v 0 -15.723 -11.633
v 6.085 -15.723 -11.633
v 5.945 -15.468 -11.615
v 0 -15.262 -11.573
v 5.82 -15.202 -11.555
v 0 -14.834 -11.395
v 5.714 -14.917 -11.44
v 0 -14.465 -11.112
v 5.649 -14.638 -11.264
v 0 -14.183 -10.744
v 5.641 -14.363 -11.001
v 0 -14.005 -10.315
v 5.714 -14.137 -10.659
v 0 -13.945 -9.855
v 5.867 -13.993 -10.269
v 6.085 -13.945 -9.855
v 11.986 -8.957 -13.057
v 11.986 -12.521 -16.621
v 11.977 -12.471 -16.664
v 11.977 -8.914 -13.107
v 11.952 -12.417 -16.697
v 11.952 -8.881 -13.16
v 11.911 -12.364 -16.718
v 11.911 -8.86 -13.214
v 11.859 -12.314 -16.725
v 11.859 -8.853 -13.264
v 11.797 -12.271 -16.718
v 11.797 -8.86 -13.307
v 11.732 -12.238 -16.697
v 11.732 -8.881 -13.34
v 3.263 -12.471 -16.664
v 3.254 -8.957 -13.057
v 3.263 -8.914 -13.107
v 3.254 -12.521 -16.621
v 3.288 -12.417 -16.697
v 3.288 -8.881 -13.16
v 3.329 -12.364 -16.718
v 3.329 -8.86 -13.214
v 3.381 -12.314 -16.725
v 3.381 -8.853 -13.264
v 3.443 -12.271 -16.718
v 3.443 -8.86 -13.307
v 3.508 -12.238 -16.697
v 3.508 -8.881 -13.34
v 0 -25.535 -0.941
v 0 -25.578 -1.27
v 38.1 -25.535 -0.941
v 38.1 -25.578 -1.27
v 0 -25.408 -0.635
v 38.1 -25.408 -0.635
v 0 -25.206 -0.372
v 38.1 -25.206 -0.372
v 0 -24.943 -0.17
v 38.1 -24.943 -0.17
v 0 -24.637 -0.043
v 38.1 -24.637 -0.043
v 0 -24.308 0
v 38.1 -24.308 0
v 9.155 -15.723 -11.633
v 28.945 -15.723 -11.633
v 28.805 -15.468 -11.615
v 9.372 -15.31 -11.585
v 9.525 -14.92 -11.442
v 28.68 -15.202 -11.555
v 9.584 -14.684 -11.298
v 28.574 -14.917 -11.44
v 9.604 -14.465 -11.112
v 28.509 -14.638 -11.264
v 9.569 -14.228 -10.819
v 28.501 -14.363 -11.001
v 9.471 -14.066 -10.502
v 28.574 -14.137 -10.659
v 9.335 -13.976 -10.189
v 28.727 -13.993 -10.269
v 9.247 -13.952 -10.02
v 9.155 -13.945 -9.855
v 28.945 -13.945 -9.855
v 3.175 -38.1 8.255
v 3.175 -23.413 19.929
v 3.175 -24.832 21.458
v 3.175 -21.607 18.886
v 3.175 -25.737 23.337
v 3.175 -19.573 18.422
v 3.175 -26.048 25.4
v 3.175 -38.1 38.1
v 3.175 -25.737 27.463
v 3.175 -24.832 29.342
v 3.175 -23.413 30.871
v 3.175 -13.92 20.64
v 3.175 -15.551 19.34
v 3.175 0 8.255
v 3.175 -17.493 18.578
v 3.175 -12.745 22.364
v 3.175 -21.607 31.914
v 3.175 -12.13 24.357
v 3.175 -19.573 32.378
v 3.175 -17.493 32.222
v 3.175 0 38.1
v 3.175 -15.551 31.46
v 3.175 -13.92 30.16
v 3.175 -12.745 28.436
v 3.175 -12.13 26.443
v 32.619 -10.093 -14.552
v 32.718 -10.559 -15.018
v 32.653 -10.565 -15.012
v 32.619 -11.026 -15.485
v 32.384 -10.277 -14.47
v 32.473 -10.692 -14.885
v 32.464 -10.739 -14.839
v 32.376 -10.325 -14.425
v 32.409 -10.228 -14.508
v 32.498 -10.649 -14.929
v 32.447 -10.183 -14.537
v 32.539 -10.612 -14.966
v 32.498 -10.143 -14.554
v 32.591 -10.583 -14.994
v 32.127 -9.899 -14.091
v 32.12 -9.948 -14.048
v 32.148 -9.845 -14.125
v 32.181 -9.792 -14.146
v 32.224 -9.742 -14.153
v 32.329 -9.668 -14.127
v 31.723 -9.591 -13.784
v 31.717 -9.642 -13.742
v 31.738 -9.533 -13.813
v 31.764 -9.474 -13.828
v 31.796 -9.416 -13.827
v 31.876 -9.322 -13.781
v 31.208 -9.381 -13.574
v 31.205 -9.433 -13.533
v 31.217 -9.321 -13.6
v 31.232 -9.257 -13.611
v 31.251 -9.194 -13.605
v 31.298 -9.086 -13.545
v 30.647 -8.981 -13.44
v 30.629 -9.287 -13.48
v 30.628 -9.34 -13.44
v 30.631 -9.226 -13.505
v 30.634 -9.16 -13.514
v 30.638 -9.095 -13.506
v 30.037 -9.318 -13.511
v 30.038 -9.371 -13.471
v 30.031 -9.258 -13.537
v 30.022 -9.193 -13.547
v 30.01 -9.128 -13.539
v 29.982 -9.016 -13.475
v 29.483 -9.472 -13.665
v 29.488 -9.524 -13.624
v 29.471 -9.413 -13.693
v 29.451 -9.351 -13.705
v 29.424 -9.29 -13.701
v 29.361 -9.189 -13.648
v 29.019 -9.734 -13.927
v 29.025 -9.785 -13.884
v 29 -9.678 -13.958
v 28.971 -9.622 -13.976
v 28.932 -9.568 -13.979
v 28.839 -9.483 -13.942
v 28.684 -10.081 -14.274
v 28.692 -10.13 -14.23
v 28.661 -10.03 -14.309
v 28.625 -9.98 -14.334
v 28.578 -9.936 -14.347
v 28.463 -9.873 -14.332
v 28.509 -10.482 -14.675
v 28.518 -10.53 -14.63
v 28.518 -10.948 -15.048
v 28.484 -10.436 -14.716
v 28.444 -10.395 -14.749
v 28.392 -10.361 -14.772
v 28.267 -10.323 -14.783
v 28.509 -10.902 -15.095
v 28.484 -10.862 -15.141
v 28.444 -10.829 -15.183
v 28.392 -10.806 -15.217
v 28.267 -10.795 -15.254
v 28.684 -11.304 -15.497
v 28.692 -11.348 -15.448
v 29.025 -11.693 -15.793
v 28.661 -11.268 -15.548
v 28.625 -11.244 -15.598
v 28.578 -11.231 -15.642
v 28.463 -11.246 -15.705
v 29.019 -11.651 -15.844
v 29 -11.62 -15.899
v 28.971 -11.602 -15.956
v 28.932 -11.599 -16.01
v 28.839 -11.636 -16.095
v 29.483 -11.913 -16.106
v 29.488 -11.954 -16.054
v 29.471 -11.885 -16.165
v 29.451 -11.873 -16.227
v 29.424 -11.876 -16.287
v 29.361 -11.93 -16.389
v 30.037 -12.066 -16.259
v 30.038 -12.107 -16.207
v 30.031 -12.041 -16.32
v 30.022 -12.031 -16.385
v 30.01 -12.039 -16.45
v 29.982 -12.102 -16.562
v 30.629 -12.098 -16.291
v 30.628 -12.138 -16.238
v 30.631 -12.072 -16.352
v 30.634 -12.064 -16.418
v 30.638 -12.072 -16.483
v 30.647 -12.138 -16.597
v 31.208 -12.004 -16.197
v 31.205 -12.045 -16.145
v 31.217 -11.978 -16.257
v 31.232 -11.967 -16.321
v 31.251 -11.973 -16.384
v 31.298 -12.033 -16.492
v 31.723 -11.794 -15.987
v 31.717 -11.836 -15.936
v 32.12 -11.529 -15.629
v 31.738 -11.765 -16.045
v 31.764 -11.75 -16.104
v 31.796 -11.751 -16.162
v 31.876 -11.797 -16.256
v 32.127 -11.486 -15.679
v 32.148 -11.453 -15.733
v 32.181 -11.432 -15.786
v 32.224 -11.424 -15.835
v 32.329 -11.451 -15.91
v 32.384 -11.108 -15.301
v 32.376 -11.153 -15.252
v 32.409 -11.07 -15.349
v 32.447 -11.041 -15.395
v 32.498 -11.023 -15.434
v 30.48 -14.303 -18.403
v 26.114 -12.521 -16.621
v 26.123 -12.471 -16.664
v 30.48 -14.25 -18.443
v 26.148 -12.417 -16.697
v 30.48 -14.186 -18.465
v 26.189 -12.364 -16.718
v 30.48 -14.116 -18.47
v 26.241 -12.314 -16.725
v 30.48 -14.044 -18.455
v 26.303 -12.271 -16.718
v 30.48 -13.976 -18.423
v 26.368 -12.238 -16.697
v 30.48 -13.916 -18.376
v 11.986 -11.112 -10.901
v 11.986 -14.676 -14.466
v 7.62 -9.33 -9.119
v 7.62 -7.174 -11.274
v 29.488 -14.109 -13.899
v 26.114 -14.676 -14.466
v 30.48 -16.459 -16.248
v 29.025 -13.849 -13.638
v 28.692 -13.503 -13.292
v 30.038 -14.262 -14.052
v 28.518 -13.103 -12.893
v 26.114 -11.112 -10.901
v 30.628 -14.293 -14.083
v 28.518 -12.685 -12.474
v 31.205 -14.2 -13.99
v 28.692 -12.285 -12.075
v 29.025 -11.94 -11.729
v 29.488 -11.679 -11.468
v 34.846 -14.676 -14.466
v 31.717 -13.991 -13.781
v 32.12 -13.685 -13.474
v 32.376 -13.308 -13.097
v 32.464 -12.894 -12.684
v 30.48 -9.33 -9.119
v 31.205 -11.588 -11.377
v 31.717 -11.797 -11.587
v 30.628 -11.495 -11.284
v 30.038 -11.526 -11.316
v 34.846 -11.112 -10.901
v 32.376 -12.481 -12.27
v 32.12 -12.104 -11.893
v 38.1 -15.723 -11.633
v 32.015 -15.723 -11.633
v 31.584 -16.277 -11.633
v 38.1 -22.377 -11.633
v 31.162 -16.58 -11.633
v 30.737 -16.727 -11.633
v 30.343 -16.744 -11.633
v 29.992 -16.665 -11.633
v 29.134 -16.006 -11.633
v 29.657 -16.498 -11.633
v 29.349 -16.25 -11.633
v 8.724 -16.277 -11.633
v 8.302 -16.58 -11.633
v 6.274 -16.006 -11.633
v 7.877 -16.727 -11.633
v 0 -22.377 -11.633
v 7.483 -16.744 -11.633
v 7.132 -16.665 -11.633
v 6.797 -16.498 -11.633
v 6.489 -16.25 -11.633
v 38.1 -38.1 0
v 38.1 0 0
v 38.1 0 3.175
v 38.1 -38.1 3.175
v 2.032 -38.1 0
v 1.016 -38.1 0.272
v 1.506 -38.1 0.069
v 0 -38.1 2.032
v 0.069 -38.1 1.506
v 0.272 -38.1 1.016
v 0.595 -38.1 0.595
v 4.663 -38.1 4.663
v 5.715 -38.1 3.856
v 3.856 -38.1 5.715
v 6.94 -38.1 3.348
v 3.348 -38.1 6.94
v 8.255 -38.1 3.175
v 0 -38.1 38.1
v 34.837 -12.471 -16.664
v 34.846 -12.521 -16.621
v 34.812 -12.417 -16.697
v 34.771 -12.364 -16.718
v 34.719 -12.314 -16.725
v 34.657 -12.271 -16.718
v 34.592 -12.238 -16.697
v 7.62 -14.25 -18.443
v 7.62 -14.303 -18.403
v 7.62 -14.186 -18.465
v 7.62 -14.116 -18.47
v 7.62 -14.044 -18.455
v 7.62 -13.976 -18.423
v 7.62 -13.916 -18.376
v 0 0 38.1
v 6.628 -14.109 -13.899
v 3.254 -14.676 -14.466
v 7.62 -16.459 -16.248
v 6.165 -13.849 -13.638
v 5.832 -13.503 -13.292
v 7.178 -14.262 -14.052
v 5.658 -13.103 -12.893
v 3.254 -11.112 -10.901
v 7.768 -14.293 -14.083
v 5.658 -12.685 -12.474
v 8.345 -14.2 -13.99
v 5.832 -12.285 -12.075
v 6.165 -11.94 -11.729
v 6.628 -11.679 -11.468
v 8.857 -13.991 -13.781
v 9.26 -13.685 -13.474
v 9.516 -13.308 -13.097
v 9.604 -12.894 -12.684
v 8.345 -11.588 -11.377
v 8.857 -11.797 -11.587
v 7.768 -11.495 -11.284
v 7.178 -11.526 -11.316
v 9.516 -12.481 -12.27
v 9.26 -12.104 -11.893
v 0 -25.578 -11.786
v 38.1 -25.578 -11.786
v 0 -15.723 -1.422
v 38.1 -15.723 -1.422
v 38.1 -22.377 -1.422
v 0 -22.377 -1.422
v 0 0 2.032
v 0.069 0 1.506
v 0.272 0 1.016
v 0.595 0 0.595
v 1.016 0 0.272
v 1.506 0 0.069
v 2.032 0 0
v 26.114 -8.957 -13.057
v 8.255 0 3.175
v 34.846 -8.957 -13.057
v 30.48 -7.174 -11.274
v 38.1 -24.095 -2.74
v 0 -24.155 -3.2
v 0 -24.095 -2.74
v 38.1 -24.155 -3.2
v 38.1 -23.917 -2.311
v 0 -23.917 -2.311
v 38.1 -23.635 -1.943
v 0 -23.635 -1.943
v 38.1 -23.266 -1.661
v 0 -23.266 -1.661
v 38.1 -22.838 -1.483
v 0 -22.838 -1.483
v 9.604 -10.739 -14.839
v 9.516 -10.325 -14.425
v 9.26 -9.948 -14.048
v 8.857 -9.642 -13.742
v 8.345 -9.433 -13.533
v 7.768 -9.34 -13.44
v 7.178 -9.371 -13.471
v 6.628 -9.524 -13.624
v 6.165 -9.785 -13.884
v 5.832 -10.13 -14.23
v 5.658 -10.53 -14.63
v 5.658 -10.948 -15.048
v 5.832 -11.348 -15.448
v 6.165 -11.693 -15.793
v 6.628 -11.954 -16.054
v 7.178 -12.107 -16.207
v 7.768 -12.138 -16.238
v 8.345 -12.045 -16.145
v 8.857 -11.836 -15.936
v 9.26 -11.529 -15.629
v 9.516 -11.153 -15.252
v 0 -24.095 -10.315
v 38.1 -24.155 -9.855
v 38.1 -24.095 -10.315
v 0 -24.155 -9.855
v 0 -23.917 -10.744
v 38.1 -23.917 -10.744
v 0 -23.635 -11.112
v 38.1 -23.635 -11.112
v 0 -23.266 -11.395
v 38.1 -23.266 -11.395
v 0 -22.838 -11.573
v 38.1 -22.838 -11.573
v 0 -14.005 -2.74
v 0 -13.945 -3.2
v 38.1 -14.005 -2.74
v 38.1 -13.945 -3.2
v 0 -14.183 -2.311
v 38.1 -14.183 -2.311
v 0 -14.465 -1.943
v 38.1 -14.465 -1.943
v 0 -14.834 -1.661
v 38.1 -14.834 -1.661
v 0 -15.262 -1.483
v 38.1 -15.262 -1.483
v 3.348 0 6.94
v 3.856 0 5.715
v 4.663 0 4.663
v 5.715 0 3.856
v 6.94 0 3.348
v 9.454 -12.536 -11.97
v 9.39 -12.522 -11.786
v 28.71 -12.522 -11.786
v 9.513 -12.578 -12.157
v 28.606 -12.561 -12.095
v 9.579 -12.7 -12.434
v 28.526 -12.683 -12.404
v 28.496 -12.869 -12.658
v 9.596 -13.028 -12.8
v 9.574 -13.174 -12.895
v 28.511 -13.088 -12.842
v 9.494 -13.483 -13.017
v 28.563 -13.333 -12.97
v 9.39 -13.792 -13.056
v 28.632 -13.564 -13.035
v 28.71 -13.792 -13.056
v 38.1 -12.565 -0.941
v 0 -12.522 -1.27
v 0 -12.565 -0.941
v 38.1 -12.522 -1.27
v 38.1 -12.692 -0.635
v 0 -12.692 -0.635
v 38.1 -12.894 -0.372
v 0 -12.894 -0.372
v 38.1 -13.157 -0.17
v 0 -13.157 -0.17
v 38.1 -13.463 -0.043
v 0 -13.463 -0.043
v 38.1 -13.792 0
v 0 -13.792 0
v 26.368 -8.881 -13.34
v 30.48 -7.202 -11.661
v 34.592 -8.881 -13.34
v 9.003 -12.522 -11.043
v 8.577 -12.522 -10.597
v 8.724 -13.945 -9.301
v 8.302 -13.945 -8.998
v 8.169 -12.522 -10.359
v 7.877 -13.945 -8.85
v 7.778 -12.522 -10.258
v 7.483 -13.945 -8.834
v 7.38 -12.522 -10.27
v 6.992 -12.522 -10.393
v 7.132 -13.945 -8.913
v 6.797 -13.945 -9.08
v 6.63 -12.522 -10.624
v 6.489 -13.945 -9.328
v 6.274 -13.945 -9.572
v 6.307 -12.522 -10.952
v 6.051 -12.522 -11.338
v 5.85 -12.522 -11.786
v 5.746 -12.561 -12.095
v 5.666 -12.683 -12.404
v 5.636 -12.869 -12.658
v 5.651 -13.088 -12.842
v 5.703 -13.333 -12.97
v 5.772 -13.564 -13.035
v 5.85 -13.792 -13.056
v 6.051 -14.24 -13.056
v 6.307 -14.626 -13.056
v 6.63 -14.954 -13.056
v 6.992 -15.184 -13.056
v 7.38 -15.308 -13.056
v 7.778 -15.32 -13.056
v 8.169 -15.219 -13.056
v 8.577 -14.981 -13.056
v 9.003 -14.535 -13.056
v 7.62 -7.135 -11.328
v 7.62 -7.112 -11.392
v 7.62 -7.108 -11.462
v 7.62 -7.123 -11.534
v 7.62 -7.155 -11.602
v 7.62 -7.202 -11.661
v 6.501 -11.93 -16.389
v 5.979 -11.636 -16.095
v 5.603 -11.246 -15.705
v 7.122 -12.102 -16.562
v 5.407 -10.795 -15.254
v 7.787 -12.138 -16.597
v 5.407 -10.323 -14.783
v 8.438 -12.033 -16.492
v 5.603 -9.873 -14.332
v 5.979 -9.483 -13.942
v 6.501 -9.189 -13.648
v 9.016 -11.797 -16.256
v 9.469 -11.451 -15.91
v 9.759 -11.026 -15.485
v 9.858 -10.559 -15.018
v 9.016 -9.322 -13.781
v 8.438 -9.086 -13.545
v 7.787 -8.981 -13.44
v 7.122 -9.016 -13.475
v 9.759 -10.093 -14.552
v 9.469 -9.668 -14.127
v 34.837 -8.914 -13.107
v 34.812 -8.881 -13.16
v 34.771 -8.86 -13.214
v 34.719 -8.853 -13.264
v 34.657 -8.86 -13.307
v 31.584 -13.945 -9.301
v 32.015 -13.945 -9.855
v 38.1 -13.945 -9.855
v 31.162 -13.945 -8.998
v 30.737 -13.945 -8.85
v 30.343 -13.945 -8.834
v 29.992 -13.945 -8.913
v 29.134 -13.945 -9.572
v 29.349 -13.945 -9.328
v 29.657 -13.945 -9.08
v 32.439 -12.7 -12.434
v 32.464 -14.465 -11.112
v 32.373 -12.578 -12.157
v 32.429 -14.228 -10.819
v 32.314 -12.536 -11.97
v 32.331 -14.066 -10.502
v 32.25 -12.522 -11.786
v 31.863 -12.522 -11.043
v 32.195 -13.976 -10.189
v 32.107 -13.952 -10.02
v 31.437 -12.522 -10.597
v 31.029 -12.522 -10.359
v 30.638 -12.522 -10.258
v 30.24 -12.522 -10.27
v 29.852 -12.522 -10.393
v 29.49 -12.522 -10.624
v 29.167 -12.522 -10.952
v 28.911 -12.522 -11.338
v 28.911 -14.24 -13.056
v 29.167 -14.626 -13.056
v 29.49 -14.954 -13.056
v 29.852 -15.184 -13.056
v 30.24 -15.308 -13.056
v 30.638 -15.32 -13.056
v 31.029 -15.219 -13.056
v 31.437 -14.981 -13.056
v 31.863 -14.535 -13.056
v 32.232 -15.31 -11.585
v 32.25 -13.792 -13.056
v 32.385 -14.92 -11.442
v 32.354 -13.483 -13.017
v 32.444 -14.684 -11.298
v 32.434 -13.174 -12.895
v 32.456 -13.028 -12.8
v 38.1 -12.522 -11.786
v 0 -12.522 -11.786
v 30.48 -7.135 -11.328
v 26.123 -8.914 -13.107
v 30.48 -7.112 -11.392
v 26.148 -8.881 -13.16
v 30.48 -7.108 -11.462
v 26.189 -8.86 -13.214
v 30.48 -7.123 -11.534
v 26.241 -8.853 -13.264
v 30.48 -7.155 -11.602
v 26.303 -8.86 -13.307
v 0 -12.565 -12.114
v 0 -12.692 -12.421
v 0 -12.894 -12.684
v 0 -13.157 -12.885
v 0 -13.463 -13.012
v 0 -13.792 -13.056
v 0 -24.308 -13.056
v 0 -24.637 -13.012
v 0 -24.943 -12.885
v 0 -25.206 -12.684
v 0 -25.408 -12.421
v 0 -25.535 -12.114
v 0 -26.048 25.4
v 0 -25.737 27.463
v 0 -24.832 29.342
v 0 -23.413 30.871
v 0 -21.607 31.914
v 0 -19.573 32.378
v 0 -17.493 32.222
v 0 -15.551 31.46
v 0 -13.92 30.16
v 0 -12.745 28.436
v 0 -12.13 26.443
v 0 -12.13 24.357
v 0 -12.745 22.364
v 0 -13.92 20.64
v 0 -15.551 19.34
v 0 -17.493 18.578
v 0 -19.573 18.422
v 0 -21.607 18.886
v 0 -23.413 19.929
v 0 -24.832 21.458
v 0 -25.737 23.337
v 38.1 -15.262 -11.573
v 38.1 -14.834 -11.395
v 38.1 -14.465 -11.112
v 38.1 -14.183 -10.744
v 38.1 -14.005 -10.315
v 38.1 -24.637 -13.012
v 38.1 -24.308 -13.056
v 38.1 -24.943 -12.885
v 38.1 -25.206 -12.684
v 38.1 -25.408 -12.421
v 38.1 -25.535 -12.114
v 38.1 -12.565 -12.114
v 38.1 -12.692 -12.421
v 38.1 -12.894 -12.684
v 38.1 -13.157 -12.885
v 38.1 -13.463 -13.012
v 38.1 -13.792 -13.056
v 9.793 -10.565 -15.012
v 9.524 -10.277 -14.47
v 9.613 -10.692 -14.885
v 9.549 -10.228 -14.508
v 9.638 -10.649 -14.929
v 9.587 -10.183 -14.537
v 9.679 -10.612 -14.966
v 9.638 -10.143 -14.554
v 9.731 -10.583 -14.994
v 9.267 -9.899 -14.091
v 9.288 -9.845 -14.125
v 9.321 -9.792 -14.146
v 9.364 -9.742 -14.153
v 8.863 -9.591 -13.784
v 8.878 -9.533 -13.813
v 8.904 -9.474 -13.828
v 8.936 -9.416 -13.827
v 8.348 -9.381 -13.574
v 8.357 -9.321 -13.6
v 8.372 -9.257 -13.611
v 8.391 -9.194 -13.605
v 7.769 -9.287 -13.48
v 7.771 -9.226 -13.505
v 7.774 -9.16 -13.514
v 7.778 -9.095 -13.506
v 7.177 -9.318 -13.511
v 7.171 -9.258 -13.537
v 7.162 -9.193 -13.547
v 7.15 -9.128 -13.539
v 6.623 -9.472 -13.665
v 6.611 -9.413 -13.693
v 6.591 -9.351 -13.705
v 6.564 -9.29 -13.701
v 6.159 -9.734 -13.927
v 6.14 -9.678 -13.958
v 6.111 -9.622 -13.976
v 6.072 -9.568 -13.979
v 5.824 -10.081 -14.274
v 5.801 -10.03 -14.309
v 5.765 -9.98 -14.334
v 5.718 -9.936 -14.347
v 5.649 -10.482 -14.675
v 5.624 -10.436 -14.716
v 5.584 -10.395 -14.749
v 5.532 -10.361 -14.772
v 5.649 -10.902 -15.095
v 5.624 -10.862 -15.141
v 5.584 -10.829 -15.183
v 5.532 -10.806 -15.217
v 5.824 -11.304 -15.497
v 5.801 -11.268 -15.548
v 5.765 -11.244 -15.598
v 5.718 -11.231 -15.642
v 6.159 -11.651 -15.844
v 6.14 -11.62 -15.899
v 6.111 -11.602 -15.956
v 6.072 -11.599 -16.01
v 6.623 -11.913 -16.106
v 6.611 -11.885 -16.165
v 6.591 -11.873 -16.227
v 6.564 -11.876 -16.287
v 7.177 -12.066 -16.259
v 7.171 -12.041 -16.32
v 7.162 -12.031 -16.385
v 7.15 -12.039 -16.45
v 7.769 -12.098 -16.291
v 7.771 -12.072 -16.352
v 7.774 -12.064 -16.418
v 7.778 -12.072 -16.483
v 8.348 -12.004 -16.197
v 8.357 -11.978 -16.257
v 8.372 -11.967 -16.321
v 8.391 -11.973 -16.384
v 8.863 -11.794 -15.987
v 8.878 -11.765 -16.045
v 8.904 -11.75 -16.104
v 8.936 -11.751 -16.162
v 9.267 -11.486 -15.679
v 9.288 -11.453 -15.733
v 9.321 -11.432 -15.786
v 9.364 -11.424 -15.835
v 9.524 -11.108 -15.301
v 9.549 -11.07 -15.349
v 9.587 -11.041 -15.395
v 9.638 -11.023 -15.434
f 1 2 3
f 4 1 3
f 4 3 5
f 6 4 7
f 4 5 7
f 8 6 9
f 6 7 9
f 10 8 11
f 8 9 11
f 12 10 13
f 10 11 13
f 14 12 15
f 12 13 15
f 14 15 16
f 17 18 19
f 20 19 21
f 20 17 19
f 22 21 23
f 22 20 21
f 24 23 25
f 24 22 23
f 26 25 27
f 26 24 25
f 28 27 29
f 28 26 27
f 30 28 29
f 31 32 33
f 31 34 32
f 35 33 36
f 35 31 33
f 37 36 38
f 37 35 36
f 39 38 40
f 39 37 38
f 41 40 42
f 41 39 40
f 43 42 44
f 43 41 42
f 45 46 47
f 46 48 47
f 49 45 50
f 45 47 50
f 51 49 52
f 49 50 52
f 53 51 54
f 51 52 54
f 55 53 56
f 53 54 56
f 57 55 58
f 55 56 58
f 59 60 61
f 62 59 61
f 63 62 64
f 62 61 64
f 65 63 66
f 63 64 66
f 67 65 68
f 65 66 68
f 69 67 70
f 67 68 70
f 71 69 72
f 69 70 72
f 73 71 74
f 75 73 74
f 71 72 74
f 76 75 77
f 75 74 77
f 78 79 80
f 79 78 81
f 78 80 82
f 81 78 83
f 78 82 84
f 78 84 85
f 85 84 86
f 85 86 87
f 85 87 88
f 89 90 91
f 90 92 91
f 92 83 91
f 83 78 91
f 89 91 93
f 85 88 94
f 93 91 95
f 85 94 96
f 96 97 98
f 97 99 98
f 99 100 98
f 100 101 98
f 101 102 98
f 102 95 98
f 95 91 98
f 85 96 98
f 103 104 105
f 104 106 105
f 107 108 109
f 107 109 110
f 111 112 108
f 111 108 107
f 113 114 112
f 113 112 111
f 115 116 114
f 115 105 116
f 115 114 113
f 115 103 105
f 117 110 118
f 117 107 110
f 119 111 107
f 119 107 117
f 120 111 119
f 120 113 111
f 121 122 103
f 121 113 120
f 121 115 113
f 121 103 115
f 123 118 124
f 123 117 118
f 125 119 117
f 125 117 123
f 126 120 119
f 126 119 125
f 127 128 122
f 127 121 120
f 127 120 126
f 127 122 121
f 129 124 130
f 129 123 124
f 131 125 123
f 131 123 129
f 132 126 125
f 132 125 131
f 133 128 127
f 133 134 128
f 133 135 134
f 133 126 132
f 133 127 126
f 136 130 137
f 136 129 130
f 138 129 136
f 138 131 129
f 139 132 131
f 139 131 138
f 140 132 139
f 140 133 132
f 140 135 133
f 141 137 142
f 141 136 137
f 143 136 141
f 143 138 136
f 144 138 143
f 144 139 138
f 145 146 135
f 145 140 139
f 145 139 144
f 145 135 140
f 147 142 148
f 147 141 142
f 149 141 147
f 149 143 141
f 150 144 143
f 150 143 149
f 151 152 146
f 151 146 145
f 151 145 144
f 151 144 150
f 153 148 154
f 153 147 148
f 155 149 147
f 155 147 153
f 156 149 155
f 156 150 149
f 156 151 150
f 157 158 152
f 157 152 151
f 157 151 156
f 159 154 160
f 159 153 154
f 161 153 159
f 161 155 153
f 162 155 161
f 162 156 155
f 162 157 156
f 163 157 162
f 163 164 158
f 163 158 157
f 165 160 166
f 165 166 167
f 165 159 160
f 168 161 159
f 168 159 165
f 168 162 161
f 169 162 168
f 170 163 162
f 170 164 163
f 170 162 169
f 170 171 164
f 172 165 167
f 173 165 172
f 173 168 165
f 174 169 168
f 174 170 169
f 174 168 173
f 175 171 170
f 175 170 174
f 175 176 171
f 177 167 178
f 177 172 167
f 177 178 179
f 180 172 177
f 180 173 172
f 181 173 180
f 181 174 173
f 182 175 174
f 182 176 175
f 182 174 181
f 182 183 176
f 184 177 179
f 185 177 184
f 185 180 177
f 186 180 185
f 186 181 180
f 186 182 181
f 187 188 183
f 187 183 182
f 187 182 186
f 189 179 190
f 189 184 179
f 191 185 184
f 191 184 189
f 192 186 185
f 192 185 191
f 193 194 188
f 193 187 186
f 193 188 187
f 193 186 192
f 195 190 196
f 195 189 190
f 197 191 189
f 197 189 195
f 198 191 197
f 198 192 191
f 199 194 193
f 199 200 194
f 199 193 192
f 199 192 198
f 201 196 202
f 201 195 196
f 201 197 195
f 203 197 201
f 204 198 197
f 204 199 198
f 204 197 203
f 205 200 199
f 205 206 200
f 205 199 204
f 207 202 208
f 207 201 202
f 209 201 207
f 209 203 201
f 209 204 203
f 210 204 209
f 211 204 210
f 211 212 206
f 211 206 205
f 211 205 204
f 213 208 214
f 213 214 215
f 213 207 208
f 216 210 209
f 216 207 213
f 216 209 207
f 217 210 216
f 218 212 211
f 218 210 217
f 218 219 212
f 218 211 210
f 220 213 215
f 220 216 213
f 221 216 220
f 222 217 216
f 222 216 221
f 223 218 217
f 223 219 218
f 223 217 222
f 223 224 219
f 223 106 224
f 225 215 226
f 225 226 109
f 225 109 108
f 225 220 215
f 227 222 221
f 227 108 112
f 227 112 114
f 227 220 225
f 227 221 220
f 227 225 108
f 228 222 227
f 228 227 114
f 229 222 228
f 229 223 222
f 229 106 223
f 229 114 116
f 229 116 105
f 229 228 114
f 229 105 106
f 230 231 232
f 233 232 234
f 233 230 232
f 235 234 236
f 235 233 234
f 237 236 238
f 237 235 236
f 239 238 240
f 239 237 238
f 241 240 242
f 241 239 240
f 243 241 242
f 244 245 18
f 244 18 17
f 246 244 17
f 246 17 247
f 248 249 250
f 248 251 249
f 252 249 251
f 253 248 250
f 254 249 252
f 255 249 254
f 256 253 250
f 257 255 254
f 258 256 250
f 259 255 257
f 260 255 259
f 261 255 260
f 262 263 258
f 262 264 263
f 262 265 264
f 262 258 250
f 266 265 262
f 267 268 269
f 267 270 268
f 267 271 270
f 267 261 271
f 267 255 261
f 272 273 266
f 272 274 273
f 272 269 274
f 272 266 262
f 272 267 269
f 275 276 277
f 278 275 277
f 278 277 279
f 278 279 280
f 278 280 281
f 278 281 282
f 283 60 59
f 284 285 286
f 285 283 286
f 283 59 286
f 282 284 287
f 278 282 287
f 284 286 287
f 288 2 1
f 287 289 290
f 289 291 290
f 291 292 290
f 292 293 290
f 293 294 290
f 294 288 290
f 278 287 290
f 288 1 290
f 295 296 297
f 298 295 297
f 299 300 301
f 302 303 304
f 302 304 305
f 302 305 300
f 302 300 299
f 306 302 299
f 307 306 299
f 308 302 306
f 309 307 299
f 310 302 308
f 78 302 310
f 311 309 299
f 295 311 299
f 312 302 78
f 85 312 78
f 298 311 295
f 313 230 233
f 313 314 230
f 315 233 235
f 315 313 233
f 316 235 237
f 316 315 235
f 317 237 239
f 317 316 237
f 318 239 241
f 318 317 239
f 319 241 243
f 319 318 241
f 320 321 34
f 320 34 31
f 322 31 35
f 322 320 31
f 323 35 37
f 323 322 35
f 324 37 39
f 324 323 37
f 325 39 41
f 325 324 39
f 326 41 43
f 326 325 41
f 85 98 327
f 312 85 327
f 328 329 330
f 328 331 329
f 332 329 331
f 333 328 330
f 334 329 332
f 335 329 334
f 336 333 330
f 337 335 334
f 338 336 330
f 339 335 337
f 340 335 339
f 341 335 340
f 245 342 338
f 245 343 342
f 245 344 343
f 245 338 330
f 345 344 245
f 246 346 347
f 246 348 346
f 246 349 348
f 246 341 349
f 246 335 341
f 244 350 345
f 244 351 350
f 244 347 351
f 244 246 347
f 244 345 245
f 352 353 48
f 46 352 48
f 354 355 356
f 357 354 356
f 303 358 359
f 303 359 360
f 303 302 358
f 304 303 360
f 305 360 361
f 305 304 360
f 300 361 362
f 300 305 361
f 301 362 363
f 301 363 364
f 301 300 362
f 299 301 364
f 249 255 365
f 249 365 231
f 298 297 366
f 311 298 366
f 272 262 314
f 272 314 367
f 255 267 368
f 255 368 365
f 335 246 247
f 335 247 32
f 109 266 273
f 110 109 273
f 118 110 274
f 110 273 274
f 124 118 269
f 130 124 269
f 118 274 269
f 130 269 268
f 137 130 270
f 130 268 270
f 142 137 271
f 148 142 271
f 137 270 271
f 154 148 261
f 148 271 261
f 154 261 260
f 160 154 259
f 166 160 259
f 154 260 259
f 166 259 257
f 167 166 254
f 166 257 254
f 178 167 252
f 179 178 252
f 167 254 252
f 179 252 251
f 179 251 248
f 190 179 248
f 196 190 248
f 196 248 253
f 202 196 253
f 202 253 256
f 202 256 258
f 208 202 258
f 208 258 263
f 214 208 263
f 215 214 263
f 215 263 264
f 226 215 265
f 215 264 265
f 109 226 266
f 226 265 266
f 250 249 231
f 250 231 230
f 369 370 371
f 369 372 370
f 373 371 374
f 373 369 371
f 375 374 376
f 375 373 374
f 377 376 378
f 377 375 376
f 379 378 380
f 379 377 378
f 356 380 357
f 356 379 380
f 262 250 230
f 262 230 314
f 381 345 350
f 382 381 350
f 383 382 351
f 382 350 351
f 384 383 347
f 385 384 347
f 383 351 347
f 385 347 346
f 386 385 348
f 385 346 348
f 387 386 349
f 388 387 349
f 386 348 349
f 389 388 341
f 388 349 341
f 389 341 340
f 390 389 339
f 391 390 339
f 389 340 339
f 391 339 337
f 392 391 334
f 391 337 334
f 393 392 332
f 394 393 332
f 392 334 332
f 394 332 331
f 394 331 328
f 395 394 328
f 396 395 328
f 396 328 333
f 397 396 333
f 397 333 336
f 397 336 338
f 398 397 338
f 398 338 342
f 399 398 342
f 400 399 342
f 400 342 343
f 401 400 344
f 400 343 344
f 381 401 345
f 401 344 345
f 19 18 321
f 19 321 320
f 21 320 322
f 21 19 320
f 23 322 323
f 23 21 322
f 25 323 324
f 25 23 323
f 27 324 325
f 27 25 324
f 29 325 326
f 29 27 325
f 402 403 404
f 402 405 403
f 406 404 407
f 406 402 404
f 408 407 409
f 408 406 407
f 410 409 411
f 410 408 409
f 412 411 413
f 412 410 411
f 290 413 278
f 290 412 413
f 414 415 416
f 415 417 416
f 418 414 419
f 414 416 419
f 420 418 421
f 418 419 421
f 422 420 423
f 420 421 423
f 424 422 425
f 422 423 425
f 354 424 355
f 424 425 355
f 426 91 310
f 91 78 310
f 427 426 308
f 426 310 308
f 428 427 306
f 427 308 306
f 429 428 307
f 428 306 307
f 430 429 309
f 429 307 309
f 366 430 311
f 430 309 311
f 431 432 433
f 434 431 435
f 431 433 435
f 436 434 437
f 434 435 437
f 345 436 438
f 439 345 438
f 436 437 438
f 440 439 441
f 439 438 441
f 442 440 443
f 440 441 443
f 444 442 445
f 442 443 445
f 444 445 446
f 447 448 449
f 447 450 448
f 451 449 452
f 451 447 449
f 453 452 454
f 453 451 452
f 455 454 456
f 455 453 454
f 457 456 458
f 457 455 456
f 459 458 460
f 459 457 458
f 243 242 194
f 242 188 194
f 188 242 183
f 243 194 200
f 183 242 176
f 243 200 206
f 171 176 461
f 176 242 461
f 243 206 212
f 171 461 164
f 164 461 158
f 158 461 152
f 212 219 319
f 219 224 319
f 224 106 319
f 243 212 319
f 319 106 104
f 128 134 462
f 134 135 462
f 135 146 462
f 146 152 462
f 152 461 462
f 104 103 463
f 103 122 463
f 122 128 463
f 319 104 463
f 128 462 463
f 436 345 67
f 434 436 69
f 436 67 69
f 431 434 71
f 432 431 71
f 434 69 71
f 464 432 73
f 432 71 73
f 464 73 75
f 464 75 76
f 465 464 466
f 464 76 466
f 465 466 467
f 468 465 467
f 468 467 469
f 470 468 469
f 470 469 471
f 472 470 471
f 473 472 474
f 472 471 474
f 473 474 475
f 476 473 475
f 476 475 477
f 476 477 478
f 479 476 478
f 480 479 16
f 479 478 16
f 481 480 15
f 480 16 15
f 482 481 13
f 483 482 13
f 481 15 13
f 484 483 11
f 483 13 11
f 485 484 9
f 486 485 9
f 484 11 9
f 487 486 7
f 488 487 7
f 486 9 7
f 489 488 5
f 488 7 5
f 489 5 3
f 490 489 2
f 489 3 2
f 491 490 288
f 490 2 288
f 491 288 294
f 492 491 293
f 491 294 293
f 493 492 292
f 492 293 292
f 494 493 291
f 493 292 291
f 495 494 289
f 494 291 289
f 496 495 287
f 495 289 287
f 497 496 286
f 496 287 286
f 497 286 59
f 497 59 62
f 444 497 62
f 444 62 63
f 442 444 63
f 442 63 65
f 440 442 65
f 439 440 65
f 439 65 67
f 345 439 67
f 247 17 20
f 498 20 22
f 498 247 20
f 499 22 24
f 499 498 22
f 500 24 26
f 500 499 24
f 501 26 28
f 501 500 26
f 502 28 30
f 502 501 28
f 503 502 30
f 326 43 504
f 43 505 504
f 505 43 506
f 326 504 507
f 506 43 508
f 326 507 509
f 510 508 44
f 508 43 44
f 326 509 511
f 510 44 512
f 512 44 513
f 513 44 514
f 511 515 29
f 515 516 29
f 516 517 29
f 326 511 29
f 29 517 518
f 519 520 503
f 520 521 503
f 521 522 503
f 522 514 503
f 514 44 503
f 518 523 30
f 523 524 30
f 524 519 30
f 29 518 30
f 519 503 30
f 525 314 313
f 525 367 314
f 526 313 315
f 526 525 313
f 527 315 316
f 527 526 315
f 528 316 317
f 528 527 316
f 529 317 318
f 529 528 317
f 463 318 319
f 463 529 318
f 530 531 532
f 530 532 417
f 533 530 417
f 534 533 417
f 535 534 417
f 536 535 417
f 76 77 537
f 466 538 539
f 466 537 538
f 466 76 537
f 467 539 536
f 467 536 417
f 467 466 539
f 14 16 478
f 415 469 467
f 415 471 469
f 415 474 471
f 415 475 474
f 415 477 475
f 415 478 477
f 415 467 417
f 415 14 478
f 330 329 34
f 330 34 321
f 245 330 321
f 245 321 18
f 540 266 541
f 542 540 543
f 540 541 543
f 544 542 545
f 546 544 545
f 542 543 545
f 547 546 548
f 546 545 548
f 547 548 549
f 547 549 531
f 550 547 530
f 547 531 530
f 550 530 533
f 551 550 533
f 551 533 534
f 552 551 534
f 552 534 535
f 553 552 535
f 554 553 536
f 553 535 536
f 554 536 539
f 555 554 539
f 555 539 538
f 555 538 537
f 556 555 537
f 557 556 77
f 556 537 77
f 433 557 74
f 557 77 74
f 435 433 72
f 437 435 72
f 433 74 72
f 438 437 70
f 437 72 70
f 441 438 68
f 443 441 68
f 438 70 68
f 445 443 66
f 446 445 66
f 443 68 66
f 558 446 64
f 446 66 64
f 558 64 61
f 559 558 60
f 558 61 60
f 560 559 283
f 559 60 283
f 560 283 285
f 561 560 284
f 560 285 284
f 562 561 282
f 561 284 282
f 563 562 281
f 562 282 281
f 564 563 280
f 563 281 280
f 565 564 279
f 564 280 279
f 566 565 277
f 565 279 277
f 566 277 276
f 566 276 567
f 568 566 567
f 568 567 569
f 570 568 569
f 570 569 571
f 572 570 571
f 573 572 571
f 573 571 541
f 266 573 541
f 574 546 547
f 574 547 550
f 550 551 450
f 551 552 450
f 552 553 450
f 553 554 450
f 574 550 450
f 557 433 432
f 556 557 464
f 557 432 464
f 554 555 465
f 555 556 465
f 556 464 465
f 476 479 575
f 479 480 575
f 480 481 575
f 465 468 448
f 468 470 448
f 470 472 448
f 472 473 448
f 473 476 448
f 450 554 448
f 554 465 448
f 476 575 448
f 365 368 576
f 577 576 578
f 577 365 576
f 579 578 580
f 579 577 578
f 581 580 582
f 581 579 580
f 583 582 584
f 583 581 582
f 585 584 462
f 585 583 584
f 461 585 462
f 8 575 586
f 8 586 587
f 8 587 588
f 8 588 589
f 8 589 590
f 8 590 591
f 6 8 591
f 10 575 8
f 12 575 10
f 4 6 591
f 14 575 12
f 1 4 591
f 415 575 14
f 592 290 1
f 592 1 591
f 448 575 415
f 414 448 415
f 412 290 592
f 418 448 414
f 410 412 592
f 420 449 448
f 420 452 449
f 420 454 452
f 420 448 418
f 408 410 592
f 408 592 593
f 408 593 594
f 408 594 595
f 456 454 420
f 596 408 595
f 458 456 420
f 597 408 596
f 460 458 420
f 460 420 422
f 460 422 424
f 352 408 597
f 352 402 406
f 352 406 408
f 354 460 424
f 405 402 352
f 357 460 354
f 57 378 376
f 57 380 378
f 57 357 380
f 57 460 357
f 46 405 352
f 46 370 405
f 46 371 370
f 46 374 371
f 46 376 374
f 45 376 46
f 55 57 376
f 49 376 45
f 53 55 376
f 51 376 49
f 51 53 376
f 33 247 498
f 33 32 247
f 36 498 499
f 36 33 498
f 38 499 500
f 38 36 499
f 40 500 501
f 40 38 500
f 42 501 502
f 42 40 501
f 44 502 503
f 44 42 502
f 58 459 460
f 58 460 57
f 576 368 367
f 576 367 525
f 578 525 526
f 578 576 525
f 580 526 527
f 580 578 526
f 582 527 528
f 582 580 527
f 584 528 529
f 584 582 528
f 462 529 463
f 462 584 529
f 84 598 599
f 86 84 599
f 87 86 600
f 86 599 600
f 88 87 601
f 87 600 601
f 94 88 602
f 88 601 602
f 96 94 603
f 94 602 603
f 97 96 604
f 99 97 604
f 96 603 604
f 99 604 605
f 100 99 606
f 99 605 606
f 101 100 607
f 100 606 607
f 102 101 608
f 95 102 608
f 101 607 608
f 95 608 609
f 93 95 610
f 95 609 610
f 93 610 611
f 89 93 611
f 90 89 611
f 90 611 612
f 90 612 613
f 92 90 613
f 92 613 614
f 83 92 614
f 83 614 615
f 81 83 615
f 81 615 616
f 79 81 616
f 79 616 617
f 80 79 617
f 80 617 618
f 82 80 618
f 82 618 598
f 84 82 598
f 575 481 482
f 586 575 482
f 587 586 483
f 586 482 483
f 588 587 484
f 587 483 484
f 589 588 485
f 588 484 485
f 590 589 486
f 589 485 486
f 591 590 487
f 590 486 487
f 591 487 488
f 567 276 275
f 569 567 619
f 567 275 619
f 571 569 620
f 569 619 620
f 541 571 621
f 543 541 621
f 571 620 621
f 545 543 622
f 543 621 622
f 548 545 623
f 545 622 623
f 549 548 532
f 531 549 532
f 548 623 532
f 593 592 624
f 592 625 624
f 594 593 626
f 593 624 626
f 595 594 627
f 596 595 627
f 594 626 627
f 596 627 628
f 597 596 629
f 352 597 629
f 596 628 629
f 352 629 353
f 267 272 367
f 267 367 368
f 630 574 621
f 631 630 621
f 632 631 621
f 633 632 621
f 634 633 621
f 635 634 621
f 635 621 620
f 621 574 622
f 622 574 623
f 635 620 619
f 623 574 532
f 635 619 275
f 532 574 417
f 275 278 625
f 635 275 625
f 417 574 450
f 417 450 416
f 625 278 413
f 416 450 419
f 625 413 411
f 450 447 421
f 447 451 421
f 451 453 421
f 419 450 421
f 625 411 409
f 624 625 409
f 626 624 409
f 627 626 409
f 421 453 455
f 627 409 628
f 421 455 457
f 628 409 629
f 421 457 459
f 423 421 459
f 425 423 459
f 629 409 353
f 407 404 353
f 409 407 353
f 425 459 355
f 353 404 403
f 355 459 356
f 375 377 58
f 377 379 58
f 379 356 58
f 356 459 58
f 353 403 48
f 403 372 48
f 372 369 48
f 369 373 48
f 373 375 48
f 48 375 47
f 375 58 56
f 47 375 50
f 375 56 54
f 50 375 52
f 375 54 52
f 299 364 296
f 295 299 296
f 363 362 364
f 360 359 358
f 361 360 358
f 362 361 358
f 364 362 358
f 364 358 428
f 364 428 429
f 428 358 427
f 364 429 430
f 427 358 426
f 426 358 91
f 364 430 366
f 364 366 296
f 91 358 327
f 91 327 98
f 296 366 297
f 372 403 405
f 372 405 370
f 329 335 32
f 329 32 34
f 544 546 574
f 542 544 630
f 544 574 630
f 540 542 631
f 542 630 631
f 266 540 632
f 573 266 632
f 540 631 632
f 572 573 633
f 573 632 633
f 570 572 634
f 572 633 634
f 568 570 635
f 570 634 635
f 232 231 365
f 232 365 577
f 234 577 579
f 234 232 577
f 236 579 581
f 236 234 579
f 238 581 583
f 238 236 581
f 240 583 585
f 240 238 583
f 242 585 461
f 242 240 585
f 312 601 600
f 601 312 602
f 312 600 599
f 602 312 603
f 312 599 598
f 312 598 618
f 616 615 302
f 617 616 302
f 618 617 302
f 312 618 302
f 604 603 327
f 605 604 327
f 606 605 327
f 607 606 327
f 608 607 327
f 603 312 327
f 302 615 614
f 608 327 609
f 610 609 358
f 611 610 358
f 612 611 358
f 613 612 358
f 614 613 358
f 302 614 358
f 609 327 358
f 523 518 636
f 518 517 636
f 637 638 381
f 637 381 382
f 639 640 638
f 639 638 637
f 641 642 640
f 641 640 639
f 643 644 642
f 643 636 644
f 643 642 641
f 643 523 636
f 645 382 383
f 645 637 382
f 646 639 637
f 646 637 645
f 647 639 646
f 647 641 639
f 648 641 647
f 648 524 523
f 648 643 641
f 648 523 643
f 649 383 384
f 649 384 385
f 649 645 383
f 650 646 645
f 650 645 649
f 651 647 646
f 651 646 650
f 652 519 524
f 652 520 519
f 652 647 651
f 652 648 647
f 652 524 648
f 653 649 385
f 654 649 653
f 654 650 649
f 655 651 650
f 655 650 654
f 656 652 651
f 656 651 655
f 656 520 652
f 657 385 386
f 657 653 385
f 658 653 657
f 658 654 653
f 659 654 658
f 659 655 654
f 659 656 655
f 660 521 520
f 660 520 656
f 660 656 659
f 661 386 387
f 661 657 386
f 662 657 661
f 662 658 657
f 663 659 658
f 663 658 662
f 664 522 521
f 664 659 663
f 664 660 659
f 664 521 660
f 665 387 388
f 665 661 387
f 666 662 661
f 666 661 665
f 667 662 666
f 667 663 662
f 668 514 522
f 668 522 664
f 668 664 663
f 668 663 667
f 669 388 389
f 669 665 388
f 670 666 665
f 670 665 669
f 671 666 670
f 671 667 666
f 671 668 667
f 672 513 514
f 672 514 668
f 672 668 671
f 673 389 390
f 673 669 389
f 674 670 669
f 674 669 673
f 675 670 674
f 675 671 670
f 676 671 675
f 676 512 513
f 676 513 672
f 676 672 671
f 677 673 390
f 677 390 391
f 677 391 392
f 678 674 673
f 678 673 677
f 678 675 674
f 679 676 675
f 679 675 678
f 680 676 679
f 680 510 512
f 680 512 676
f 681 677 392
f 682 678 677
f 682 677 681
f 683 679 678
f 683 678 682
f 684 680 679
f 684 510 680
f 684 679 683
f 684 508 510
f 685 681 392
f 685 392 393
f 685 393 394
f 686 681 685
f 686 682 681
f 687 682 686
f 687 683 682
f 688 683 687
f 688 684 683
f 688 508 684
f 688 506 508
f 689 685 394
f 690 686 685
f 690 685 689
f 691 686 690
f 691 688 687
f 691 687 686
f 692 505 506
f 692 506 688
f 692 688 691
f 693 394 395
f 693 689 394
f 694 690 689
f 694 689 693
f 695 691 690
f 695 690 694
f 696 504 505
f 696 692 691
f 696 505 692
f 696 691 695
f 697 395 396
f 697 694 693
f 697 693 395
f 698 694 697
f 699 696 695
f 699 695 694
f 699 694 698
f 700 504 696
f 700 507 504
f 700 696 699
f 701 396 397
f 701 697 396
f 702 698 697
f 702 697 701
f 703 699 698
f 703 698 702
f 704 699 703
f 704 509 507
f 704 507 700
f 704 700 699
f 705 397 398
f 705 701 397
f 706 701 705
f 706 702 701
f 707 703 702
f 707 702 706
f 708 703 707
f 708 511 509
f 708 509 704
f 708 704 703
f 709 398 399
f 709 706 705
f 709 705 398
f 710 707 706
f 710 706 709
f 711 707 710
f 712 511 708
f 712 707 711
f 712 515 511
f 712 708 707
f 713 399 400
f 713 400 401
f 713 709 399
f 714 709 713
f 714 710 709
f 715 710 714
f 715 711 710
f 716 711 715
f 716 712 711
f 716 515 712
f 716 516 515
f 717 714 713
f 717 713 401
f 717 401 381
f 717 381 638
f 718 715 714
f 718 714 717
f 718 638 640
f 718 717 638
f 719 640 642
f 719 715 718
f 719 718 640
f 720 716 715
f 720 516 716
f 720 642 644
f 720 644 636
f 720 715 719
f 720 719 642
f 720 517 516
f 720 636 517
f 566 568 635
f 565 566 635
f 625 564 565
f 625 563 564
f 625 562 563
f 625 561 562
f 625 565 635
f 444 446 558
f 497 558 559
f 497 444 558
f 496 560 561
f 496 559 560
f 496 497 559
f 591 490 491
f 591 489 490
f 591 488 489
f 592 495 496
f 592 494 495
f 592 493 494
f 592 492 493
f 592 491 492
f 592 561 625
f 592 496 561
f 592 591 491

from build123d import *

# Parameters (mm, degrees)
F1_DEPTH  = 38.1
F2_R      = 6.9977
F3_DEPTH  = 38.101
F4_R      = 2.032
F5_R      = 5.08
F6_W      = 13.0556
F6_H      = 13.0556
F7_DEPTH  = 38.1
F8_T      = -1.4224
F9_R      = 1.27
F10_R     = 1.778
F12_R     = 1.984375
F13_DEPTH = 17.1892102157
F16_R     = 1.984375
F17_DEPTH = 3.302
F18_R     = 0.254
F18_2_R   = 0.254


with BuildPart() as f1:
    # F0 (on Front) → F1 (new body)
    with BuildSketch(Plane.XZ):
        Polygon((3.175, 38.1), (0, 38.1), (0, 0), (38.1, 0), (38.1, 3.175), (3.175, 3.175), align=None)
    extrude(amount=F1_DEPTH)

    # F2 (on face) → F3 (cut, through all)
    with BuildSketch(Plane(origin=(0, 0, 0), x_dir=(0, -1, 0), z_dir=(-1, 0, 0))):
        with Locations((19.05, 25.4)):
            Circle(F2_R)
    extrude(amount=-F3_DEPTH, mode=Mode.SUBTRACT)

    # F4
    f4_edges = [f1.edges().sort_by_distance(p)[0] for p in [
        (0, -19.05, 0),
    ]]
    fillet(f4_edges, radius=F4_R)

    # F5
    f5_edges = [f1.edges().sort_by_distance(p)[0] for p in [
        (3.175, -19.05, 3.175),
    ]]
    fillet(f5_edges, radius=F5_R)


with BuildPart() as f7:
    # F6 (on face) → F7 (new body, through all)
    with BuildSketch(Plane(origin=(0, 0, 0), x_dir=(0, -1, 0), z_dir=(-1, 0, 0))):
        with Locations((19.05, -6.5278)):
            Rectangle(F6_W, F6_H)
    extrude(amount=-F7_DEPTH)

    # F8
    f8_openings = [f7.faces().sort_by_distance(p)[0] for p in [
        (38.1, -19.05, -6.5278),
        (0, -19.05, -6.5278),
    ]]
    offset(amount=F8_T, openings=f8_openings)

    # F9
    f9_edges = [f7.edges().sort_by_distance(p)[0] for p in [
        (19.05, -25.5778, -13.0556),
        (19.05, -25.5778, 0),
        (19.05, -12.5222, -13.0556),
        (19.05, -12.5222, 0),
    ]]
    fillet(f9_edges, radius=F9_R)

    # F10
    f10_edges = [f7.edges().sort_by_distance(p)[0] for p in [
        (19.05, -24.1554, -11.6332),
        (19.05, -24.1554, -1.4224),
        (19.05, -13.9446, -1.4224),
        (19.05, -13.9446, -11.6332),
    ]]
    fillet(f10_edges, radius=F10_R)

    # F12 (on face) → F13 (cut, through all)
    with BuildSketch(Plane(origin=(0, -5.6261, 5.6261), x_dir=(1, 0, 0), z_dir=(0, -0.7071067812, 0.7071067812))):
        with Locations((30.48, -18.0862358278)):
            Circle(F12_R)
        with Locations((7.62, -18.0862358278)):
            Circle(F12_R)
    extrude(amount=-F13_DEPTH, mode=Mode.SUBTRACT)


with BuildPart() as f17:
    # F16 (on face) → F17 (new body)
    with BuildSketch(Plane(origin=(0, -0.1052743879, 0.1052743879), x_dir=(1, 0, 0), z_dir=(0, -0.7071067812, 0.7071067812))):
        Polygon((11.985625, -20.6067305968), (11.985625, -15.5657410589), (7.62, -13.04524629), (3.254375, -15.5657410589), (3.254375, -20.6067305968), (7.62, -23.1272253657), align=None)
        with Locations((7.62, -18.0862358278)):
            Circle(F16_R, mode=Mode.SUBTRACT)
    extrude(amount=-F17_DEPTH)

    # F18
    f18_edges = [f17.edges().sort_by_distance(p)[0] for p in [
        (9.802812, -13.232696, -17.691881),
        (11.985625, -10.559308, -15.018492),
        (9.802812, -7.885919, -12.345104),
        (5.437187, -7.885919, -12.345104),
        (3.254375, -10.559308, -15.018492),
        (5.437188, -13.232696, -17.691881),
        (5.635625, -10.559308, -15.018492),
    ]]
    fillet(f18_edges, radius=F18_R)


with BuildPart() as f17b:
    # F16 (on face) → F17, piece 2 (new body)
    with BuildSketch(Plane(origin=(0, -0.1052743879, 0.1052743879), x_dir=(1, 0, 0), z_dir=(0, -0.7071067812, 0.7071067812))):
        Polygon((34.845625, -15.5657410589), (30.48, -13.04524629), (26.114375, -15.5657410589), (26.114375, -20.6067305968), (30.48, -23.1272253657), (34.845625, -20.6067305968), align=None)
        with Locations((30.48, -18.0862358278)):
            Circle(F16_R, mode=Mode.SUBTRACT)
    extrude(amount=-F17_DEPTH)

    # F18#2
    f18_2_edges = [f17b.edges().sort_by_distance(p)[0] for p in [
        (34.845625, -10.559308, -15.018492),
        (32.662813, -7.885919, -12.345104),
        (28.297187, -7.885919, -12.345104),
        (26.114375, -10.559308, -15.018492),
        (28.297187, -13.232696, -17.691881),
        (32.662813, -13.232696, -17.691881),
        (28.495625, -10.559308, -15.018492),
    ]]
    fillet(f18_2_edges, radius=F18_2_R)


solid = Compound([f1.part, f7.part, f17.part, f17b.part])
